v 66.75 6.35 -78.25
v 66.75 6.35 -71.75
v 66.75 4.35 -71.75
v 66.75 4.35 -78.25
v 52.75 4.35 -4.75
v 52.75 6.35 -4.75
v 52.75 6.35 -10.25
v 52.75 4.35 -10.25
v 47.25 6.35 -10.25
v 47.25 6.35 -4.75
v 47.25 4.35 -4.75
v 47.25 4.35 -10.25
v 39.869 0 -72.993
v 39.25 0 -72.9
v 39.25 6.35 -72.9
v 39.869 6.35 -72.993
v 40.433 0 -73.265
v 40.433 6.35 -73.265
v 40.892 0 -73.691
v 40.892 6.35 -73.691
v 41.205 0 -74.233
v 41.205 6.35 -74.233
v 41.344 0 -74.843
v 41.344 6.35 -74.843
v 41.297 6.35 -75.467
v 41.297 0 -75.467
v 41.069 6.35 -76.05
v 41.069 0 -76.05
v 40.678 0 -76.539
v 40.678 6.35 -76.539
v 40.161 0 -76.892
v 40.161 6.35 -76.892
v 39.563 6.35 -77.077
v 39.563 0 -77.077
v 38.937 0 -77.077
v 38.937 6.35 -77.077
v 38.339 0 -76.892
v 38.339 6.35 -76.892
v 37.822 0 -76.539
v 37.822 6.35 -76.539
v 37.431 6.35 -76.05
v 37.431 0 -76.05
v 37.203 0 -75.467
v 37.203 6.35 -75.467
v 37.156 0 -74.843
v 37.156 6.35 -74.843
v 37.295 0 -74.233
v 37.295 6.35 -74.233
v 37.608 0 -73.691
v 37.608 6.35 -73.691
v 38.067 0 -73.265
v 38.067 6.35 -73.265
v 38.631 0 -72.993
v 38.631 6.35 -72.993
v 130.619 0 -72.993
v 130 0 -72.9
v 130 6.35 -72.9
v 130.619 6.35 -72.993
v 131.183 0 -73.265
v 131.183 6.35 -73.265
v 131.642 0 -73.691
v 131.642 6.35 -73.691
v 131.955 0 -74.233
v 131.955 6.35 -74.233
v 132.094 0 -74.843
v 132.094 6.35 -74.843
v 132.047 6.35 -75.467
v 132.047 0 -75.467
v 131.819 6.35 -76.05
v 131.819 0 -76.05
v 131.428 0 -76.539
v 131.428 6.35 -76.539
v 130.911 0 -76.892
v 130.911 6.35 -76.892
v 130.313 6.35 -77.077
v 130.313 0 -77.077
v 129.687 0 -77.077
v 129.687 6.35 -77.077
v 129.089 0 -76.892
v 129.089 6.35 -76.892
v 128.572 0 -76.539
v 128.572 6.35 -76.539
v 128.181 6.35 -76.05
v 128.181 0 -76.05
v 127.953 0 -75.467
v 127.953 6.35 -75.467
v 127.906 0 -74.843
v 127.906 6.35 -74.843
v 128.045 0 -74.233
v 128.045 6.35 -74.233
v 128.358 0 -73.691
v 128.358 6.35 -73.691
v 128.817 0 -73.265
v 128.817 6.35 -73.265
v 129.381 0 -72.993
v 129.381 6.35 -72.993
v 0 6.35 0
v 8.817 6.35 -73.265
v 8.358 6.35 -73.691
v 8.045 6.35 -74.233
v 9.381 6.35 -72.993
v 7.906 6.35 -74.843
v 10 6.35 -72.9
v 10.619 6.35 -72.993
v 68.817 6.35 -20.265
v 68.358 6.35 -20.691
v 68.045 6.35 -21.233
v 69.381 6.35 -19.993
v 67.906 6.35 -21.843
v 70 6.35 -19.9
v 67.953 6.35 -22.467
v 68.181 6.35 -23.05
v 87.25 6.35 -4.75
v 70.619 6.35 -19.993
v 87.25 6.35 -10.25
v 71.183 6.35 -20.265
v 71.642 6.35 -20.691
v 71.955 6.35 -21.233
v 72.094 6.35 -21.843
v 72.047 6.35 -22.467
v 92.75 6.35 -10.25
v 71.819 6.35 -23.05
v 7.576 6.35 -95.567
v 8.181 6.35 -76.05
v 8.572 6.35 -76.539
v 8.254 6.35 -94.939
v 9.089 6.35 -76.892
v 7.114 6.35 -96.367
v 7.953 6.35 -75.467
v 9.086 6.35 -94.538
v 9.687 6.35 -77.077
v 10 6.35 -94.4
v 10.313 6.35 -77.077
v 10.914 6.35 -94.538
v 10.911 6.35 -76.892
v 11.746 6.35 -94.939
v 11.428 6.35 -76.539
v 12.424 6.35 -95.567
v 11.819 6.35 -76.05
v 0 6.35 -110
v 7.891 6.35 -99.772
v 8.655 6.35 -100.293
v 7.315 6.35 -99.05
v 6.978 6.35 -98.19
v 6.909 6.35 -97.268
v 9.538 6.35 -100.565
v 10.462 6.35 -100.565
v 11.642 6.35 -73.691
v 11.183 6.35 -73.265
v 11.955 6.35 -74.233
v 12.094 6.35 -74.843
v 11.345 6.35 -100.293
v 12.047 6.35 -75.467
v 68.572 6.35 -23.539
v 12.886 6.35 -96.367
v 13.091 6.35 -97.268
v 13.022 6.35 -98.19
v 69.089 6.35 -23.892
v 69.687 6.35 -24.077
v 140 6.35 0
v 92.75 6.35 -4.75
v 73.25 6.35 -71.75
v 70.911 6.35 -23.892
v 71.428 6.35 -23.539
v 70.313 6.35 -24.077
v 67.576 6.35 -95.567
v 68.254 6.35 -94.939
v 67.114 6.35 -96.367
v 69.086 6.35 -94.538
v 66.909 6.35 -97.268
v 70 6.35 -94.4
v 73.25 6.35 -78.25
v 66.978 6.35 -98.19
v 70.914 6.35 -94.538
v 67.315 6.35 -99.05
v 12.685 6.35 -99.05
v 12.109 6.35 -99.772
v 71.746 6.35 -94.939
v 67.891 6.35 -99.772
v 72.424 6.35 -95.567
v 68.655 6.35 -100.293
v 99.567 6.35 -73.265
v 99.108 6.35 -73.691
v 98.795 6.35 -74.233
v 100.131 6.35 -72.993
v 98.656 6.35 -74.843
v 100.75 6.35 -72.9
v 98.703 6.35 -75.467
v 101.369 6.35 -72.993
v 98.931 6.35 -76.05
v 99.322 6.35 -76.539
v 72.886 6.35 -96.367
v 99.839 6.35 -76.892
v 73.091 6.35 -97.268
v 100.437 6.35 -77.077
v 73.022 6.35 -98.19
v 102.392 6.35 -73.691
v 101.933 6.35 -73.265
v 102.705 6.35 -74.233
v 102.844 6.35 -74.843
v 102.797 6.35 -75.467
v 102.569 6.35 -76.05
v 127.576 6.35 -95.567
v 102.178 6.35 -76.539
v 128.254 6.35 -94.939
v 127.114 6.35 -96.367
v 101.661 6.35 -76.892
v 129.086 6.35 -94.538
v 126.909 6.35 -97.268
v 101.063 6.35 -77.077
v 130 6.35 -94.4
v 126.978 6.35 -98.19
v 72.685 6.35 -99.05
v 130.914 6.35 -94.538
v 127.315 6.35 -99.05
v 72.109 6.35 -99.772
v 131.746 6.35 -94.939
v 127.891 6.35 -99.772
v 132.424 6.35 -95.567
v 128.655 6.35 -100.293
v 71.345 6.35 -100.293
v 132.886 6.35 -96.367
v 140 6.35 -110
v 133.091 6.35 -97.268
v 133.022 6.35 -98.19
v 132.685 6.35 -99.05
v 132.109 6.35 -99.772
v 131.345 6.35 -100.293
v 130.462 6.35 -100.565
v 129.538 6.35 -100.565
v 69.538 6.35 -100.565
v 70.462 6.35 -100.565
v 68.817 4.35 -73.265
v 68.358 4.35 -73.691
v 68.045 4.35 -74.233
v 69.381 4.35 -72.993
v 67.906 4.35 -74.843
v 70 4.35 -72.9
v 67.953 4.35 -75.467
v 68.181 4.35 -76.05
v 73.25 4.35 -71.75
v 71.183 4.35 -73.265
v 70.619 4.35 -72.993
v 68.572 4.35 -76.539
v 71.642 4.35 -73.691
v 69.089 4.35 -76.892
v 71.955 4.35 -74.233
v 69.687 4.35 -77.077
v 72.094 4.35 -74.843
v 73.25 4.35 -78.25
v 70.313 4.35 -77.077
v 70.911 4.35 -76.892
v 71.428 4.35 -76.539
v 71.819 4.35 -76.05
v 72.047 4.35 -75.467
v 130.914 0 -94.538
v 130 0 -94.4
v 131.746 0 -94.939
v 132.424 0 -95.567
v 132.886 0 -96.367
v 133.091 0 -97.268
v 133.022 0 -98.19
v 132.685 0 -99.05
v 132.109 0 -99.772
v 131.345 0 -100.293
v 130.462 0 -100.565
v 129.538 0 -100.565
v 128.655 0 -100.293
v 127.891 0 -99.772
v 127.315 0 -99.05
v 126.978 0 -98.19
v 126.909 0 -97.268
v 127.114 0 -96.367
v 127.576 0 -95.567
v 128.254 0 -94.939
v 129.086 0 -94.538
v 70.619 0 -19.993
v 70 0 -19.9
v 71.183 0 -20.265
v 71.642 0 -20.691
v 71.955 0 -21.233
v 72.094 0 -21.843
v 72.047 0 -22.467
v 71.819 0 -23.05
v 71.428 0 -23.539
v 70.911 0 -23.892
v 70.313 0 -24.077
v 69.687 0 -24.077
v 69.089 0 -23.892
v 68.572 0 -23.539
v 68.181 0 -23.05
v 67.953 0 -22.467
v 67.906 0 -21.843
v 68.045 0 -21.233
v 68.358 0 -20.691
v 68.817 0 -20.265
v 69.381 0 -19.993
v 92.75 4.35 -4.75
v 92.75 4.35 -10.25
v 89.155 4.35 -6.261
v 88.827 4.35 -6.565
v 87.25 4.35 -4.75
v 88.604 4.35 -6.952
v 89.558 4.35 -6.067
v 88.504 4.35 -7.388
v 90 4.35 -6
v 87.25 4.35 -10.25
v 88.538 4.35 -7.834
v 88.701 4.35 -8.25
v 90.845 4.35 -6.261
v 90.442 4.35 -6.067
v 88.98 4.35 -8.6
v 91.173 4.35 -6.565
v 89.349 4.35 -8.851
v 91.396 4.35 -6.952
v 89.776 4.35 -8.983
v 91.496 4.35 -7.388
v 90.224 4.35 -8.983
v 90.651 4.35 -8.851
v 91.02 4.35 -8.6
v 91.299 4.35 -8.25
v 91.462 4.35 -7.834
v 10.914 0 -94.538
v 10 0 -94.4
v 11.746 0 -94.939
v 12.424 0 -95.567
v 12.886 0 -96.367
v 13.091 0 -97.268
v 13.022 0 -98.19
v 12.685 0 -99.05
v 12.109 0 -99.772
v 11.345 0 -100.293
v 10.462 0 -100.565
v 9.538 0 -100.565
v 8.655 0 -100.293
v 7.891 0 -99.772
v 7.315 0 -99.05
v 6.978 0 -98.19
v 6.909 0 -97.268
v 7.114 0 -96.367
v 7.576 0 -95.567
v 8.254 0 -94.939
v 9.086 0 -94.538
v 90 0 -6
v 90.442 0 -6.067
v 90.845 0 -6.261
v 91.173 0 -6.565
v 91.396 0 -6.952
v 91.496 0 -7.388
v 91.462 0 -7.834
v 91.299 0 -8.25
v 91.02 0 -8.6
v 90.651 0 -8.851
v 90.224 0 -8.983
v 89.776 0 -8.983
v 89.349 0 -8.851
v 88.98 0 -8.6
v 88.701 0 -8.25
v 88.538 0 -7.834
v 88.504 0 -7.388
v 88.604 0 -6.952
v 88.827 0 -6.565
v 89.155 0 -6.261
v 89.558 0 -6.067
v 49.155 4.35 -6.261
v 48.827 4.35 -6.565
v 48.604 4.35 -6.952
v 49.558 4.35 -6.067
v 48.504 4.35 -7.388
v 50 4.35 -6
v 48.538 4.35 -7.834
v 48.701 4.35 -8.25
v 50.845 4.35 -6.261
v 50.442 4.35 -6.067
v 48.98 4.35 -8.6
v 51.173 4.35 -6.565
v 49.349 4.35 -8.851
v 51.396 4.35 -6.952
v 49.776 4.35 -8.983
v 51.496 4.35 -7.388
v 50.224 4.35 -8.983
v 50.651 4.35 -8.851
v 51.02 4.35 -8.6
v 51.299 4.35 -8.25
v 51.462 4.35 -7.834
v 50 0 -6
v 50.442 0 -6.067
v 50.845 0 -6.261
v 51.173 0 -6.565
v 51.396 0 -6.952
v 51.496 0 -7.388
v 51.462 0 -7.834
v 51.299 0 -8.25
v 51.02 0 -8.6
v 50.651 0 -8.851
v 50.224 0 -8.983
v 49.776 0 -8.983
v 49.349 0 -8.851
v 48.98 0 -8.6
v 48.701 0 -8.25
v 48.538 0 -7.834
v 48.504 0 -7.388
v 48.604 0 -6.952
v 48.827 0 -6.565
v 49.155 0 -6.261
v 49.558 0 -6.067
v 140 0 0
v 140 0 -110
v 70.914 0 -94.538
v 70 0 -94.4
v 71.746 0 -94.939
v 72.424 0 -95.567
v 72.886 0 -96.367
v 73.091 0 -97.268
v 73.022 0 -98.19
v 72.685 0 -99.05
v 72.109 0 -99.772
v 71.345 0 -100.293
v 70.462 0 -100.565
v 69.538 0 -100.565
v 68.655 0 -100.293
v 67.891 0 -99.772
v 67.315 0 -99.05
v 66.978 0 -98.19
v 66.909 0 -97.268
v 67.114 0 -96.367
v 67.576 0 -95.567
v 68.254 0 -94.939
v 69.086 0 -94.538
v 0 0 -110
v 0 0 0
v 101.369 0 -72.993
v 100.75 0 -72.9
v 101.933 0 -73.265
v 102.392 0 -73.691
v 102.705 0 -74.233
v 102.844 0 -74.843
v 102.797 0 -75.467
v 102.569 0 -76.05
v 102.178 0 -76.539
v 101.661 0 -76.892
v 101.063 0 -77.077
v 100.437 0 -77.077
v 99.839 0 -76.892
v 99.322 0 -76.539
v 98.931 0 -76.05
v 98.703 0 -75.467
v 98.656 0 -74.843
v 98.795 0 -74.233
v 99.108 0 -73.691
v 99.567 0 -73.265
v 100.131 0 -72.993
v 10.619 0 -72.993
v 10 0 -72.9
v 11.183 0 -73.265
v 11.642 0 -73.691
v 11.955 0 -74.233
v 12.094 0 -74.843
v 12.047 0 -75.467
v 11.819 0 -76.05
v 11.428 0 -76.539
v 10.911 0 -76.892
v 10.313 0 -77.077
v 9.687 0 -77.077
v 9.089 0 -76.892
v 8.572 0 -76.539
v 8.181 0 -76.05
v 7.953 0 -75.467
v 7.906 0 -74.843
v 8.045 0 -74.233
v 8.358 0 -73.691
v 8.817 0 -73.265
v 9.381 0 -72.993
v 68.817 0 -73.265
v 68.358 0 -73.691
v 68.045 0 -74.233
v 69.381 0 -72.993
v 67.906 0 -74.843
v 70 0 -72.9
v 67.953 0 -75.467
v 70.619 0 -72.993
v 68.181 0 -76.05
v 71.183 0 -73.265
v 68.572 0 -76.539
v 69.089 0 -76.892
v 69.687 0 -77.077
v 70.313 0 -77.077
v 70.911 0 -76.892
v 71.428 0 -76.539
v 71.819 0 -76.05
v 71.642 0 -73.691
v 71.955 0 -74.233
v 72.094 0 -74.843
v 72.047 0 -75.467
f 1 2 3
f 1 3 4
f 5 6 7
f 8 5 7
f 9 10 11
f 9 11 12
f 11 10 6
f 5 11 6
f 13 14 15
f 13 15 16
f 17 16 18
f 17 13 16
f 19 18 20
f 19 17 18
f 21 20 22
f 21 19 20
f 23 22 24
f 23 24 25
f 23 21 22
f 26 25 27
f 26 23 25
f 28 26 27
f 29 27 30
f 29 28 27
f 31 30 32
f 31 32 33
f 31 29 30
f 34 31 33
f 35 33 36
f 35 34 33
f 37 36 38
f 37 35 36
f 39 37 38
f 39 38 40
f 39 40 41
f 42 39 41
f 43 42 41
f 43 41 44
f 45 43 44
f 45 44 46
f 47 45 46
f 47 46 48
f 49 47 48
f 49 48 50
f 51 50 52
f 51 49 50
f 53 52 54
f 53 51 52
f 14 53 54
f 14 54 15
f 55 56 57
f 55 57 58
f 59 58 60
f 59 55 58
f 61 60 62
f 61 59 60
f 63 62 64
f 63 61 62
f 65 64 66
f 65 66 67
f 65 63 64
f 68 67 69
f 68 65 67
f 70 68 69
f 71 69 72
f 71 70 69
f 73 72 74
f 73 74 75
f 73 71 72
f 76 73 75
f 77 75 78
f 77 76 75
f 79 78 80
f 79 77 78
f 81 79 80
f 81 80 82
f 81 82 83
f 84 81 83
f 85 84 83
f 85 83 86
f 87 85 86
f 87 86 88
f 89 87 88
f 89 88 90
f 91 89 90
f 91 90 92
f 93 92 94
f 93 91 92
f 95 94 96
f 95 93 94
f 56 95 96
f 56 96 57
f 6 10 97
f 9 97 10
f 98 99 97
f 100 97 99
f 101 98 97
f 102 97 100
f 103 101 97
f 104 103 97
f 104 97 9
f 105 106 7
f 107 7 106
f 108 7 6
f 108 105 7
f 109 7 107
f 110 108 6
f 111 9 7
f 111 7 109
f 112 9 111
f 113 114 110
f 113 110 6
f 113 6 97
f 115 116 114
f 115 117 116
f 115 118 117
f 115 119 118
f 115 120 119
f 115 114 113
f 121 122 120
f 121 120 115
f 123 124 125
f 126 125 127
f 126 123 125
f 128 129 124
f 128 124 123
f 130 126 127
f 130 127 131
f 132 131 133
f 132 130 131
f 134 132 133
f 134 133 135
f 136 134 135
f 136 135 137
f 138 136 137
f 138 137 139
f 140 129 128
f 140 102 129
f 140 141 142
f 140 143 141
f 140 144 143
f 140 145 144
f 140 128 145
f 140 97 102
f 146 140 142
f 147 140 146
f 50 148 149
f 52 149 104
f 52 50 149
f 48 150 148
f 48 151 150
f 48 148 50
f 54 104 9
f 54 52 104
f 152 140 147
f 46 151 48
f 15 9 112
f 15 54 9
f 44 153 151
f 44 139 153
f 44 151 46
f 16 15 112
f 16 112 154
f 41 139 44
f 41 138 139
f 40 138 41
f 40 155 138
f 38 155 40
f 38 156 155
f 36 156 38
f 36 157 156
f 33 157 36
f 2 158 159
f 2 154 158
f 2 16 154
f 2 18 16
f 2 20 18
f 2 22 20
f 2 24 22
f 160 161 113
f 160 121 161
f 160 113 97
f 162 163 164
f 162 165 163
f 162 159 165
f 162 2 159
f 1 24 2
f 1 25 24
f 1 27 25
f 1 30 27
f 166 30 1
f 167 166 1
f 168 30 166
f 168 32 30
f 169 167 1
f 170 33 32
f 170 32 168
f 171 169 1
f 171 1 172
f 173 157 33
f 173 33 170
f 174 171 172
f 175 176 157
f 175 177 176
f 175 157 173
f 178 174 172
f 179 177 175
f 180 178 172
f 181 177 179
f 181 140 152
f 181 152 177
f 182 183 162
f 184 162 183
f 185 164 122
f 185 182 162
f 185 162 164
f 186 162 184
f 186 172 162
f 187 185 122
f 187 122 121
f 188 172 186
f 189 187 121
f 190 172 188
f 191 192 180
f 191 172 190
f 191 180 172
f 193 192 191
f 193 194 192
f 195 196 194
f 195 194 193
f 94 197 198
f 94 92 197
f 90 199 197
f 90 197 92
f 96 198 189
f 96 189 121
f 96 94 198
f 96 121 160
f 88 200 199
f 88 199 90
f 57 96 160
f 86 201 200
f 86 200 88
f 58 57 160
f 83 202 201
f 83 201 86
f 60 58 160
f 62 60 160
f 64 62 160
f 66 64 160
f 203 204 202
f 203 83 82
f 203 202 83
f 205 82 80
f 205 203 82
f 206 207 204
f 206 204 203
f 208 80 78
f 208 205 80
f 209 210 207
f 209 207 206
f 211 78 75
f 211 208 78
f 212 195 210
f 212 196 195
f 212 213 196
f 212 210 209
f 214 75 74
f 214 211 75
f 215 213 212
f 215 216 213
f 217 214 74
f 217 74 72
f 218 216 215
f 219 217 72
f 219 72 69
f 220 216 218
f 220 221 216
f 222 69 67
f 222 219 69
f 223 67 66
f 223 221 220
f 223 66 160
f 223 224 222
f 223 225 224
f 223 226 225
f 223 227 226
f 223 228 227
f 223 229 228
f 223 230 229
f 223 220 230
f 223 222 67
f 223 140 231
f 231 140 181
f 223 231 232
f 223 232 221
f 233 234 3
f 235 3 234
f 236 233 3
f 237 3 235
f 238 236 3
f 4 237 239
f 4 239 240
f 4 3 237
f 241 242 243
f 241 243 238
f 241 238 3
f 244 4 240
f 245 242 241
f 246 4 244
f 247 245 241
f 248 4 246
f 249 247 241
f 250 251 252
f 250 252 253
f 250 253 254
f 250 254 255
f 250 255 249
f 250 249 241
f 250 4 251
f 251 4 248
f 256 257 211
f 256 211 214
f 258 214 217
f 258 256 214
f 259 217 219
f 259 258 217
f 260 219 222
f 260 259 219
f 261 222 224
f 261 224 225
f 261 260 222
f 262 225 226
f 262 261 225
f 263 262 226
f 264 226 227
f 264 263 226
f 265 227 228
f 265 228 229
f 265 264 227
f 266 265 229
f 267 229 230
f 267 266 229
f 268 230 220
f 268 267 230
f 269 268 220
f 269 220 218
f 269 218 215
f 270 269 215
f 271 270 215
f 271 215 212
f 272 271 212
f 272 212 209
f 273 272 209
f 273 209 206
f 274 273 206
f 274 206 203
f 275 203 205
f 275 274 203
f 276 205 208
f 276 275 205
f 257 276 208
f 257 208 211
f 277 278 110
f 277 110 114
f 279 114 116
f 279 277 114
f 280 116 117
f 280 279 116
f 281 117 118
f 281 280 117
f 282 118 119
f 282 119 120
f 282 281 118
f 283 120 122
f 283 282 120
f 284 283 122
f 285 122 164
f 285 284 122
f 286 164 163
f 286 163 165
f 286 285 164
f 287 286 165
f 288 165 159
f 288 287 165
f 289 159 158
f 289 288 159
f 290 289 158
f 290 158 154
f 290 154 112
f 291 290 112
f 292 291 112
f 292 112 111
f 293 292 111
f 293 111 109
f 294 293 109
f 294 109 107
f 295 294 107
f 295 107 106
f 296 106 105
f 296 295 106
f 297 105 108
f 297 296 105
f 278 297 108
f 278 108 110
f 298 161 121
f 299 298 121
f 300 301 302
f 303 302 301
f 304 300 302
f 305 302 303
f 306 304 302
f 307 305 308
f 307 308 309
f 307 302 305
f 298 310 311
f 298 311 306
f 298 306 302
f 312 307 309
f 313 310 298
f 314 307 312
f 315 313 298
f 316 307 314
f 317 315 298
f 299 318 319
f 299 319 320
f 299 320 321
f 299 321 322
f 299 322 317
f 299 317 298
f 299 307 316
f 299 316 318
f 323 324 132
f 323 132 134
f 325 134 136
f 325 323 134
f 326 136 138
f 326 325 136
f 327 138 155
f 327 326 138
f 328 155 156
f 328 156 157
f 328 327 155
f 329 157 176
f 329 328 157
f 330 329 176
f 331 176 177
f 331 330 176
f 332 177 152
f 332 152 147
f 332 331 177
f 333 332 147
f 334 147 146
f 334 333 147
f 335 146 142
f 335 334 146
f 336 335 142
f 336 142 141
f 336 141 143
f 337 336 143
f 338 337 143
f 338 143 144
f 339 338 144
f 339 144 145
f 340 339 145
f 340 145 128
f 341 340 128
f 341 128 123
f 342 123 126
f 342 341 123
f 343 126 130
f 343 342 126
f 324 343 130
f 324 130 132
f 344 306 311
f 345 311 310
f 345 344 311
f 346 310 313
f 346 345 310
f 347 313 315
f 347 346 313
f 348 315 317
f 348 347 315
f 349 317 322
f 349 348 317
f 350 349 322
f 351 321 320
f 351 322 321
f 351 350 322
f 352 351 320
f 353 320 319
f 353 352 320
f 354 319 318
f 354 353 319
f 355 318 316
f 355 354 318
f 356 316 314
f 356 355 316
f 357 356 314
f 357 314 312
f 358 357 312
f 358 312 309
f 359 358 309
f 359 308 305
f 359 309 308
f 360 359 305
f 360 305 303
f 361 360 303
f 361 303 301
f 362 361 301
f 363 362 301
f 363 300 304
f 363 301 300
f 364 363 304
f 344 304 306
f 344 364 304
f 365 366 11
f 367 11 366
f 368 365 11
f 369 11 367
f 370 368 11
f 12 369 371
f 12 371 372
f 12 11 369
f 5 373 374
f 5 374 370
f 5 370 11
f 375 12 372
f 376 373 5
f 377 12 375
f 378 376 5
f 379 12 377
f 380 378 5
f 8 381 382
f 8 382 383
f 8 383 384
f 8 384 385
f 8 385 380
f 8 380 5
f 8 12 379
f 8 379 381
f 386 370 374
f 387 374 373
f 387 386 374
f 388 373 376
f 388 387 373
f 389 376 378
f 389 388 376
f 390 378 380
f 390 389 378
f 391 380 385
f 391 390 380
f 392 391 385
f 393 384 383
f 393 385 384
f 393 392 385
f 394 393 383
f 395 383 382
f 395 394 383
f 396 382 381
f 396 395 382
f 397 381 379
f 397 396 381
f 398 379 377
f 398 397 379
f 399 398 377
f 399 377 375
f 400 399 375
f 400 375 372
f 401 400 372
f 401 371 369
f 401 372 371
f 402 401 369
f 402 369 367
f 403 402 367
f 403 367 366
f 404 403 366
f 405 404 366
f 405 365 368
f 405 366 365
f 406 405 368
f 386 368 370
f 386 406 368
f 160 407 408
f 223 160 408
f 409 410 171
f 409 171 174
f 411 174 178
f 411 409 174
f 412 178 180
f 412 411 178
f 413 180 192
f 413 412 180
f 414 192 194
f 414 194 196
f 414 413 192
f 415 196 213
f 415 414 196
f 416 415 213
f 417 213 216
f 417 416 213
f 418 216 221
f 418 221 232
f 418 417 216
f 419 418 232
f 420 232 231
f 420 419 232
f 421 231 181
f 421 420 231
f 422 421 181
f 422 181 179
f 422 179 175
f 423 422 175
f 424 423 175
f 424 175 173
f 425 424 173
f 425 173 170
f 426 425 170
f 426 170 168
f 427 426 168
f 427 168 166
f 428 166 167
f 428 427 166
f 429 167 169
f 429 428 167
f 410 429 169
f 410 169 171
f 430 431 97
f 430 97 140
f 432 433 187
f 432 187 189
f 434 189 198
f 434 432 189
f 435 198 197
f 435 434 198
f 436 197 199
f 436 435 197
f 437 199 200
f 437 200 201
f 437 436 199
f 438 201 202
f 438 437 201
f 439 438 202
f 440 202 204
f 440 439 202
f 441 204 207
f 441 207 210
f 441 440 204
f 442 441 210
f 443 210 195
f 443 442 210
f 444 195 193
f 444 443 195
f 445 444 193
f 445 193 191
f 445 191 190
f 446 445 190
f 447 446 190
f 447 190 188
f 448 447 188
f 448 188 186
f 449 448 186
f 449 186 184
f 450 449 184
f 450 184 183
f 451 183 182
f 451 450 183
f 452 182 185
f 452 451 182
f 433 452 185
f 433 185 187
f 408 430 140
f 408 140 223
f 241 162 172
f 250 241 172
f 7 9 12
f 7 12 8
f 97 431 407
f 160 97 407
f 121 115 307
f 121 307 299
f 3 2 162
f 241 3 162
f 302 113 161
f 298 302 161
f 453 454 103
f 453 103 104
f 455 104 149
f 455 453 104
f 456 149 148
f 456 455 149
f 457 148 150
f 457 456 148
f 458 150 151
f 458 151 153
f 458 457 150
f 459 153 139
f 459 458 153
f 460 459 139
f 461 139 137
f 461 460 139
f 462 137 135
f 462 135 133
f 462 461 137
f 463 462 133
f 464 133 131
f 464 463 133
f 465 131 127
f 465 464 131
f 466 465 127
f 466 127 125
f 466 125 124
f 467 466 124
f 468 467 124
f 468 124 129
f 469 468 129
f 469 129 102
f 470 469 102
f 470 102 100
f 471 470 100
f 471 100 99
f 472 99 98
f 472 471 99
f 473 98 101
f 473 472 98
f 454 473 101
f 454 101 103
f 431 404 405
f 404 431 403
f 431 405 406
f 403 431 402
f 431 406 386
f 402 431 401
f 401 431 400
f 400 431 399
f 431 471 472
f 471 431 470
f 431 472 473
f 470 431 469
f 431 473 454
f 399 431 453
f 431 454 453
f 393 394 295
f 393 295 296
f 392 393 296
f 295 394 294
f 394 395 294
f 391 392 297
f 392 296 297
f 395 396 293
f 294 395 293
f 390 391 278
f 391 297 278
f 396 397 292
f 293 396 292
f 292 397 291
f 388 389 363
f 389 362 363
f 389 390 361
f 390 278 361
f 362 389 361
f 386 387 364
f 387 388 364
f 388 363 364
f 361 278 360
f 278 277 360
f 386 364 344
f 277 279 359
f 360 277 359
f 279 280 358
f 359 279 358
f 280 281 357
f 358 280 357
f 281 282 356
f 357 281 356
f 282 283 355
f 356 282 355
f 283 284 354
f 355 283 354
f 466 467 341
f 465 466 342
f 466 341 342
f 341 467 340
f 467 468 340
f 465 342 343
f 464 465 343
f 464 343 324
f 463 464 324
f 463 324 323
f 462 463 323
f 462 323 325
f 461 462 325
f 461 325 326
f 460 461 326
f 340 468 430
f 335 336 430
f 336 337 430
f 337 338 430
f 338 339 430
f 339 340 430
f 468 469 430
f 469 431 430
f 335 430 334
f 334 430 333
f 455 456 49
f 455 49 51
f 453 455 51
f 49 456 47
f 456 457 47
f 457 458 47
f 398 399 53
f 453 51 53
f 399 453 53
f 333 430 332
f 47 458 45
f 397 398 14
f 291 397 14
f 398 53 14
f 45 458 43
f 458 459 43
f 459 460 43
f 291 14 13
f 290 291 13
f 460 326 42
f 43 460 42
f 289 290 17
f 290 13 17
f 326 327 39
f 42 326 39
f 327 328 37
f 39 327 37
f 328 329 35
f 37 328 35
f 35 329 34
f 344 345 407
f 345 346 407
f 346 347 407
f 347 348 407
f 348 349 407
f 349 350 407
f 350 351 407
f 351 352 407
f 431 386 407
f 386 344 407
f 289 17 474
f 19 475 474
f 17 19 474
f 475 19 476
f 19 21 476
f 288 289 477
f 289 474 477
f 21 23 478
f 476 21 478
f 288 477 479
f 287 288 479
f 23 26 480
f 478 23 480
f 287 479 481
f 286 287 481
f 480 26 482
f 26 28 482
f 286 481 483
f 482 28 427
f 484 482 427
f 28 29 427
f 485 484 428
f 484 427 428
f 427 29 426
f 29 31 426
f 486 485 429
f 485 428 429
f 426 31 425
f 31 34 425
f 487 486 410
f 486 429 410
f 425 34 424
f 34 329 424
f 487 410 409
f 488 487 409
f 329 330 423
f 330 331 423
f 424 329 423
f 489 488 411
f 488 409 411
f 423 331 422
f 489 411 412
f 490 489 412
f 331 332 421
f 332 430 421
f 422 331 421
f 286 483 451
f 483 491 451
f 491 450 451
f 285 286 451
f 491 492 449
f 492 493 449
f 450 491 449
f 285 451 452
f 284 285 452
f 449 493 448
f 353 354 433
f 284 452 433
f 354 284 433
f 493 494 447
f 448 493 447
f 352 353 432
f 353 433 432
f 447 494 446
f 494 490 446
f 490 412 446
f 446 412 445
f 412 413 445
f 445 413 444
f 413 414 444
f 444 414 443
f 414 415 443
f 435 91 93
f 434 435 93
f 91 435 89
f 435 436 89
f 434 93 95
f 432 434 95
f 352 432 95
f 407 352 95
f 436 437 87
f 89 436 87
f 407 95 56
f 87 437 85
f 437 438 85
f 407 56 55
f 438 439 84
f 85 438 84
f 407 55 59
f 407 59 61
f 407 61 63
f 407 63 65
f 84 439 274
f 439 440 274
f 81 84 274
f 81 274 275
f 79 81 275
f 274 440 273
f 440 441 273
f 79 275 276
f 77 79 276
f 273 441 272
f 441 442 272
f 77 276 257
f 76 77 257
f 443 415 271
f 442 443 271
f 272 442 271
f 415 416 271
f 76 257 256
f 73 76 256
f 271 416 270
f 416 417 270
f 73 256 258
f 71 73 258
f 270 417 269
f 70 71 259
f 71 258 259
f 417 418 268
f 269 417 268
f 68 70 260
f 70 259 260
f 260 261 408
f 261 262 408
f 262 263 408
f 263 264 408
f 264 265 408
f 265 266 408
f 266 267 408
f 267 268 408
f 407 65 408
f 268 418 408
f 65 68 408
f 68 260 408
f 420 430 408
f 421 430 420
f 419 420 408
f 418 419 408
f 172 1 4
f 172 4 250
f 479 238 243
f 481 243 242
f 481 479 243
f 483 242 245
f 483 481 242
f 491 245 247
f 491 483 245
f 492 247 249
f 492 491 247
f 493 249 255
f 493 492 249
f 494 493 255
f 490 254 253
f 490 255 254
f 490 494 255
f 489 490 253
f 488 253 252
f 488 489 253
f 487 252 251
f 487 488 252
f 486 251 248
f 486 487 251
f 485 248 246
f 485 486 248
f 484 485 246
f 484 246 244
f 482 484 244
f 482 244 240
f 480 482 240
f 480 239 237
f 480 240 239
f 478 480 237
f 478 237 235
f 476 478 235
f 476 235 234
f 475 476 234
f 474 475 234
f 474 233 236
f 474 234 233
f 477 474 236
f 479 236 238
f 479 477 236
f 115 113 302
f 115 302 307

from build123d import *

# Parameters (mm, degrees)
SKETCH2_W           = 140
SKETCH2_H           = 110
SKETCH2_R           = 2.1
SKETCH2_R_2         = 3.1
SKETCH2_R_3         = 1.5
BOSS_EXTRUDE2_DEPTH = 6.35
SKETCH3_W           = 6.5
SKETCH3_H           = 6.5
SKETCH3_W_2         = 5.5
SKETCH3_H_2         = 5.5
CUT_EXTRUDE1_DEPTH  = 2


with BuildPart() as part:
    # Sketch2 → Boss-Extrude2 (new body)
    with BuildSketch(Plane(origin=(0, 0, 0), x_dir=(1, 0, 0), z_dir=(0, 1, 0))):
        with Locations((70, 55)):
            Rectangle(SKETCH2_W, SKETCH2_H)
        with Locations(Location((39.25, 75, 0), (0, 0, 270))):
            Circle(SKETCH2_R, mode=Mode.SUBTRACT)
        with Locations(Location((100.75, 75, 0), (0, 0, 270))):
            Circle(SKETCH2_R, mode=Mode.SUBTRACT)
        with Locations(Location((70, 22, 0), (0, 0, 270))):
            Circle(SKETCH2_R, mode=Mode.SUBTRACT)
        with Locations(Location((10, 97.5, 0), (0, 0, 270))):
            Circle(SKETCH2_R_2, mode=Mode.SUBTRACT)
        with Locations(Location((70, 97.5, 0), (0, 0, 270))):
            Circle(SKETCH2_R_2, mode=Mode.SUBTRACT)
        with Locations(Location((130, 97.5, 0), (0, 0, 270))):
            Circle(SKETCH2_R_2, mode=Mode.SUBTRACT)
        with Locations(Location((10, 75, 0), (0, 0, 270))):
            Circle(SKETCH2_R, mode=Mode.SUBTRACT)
        with Locations(Location((70, 75, 0), (0, 0, 270))):
            Circle(SKETCH2_R, mode=Mode.SUBTRACT)
        with Locations(Location((130, 75, 0), (0, 0, 270))):
            Circle(SKETCH2_R, mode=Mode.SUBTRACT)
        with Locations(Location((50, 7.5, 0), (0, 0, 270))):
            Circle(SKETCH2_R_3, mode=Mode.SUBTRACT)
        with Locations(Location((90, 7.5, 0), (0, 0, 270))):
            Circle(SKETCH2_R_3, mode=Mode.SUBTRACT)
    extrude(amount=BOSS_EXTRUDE2_DEPTH)

    # Sketch3 → Cut-Extrude1 (cut)
    with BuildSketch(Plane(origin=(0, 6.35, 0), x_dir=(1, 0, 0), z_dir=(0, 1, 0))):
        with Locations((70, 75)):
            Rectangle(SKETCH3_W, SKETCH3_H)
        with Locations((50, 7.5)):
            Rectangle(SKETCH3_W_2, SKETCH3_H_2)
        with Locations((90, 7.5)):
            Rectangle(SKETCH3_W_2, SKETCH3_H_2)
    extrude(amount=-CUT_EXTRUDE1_DEPTH, mode=Mode.SUBTRACT)


solid = part.part
